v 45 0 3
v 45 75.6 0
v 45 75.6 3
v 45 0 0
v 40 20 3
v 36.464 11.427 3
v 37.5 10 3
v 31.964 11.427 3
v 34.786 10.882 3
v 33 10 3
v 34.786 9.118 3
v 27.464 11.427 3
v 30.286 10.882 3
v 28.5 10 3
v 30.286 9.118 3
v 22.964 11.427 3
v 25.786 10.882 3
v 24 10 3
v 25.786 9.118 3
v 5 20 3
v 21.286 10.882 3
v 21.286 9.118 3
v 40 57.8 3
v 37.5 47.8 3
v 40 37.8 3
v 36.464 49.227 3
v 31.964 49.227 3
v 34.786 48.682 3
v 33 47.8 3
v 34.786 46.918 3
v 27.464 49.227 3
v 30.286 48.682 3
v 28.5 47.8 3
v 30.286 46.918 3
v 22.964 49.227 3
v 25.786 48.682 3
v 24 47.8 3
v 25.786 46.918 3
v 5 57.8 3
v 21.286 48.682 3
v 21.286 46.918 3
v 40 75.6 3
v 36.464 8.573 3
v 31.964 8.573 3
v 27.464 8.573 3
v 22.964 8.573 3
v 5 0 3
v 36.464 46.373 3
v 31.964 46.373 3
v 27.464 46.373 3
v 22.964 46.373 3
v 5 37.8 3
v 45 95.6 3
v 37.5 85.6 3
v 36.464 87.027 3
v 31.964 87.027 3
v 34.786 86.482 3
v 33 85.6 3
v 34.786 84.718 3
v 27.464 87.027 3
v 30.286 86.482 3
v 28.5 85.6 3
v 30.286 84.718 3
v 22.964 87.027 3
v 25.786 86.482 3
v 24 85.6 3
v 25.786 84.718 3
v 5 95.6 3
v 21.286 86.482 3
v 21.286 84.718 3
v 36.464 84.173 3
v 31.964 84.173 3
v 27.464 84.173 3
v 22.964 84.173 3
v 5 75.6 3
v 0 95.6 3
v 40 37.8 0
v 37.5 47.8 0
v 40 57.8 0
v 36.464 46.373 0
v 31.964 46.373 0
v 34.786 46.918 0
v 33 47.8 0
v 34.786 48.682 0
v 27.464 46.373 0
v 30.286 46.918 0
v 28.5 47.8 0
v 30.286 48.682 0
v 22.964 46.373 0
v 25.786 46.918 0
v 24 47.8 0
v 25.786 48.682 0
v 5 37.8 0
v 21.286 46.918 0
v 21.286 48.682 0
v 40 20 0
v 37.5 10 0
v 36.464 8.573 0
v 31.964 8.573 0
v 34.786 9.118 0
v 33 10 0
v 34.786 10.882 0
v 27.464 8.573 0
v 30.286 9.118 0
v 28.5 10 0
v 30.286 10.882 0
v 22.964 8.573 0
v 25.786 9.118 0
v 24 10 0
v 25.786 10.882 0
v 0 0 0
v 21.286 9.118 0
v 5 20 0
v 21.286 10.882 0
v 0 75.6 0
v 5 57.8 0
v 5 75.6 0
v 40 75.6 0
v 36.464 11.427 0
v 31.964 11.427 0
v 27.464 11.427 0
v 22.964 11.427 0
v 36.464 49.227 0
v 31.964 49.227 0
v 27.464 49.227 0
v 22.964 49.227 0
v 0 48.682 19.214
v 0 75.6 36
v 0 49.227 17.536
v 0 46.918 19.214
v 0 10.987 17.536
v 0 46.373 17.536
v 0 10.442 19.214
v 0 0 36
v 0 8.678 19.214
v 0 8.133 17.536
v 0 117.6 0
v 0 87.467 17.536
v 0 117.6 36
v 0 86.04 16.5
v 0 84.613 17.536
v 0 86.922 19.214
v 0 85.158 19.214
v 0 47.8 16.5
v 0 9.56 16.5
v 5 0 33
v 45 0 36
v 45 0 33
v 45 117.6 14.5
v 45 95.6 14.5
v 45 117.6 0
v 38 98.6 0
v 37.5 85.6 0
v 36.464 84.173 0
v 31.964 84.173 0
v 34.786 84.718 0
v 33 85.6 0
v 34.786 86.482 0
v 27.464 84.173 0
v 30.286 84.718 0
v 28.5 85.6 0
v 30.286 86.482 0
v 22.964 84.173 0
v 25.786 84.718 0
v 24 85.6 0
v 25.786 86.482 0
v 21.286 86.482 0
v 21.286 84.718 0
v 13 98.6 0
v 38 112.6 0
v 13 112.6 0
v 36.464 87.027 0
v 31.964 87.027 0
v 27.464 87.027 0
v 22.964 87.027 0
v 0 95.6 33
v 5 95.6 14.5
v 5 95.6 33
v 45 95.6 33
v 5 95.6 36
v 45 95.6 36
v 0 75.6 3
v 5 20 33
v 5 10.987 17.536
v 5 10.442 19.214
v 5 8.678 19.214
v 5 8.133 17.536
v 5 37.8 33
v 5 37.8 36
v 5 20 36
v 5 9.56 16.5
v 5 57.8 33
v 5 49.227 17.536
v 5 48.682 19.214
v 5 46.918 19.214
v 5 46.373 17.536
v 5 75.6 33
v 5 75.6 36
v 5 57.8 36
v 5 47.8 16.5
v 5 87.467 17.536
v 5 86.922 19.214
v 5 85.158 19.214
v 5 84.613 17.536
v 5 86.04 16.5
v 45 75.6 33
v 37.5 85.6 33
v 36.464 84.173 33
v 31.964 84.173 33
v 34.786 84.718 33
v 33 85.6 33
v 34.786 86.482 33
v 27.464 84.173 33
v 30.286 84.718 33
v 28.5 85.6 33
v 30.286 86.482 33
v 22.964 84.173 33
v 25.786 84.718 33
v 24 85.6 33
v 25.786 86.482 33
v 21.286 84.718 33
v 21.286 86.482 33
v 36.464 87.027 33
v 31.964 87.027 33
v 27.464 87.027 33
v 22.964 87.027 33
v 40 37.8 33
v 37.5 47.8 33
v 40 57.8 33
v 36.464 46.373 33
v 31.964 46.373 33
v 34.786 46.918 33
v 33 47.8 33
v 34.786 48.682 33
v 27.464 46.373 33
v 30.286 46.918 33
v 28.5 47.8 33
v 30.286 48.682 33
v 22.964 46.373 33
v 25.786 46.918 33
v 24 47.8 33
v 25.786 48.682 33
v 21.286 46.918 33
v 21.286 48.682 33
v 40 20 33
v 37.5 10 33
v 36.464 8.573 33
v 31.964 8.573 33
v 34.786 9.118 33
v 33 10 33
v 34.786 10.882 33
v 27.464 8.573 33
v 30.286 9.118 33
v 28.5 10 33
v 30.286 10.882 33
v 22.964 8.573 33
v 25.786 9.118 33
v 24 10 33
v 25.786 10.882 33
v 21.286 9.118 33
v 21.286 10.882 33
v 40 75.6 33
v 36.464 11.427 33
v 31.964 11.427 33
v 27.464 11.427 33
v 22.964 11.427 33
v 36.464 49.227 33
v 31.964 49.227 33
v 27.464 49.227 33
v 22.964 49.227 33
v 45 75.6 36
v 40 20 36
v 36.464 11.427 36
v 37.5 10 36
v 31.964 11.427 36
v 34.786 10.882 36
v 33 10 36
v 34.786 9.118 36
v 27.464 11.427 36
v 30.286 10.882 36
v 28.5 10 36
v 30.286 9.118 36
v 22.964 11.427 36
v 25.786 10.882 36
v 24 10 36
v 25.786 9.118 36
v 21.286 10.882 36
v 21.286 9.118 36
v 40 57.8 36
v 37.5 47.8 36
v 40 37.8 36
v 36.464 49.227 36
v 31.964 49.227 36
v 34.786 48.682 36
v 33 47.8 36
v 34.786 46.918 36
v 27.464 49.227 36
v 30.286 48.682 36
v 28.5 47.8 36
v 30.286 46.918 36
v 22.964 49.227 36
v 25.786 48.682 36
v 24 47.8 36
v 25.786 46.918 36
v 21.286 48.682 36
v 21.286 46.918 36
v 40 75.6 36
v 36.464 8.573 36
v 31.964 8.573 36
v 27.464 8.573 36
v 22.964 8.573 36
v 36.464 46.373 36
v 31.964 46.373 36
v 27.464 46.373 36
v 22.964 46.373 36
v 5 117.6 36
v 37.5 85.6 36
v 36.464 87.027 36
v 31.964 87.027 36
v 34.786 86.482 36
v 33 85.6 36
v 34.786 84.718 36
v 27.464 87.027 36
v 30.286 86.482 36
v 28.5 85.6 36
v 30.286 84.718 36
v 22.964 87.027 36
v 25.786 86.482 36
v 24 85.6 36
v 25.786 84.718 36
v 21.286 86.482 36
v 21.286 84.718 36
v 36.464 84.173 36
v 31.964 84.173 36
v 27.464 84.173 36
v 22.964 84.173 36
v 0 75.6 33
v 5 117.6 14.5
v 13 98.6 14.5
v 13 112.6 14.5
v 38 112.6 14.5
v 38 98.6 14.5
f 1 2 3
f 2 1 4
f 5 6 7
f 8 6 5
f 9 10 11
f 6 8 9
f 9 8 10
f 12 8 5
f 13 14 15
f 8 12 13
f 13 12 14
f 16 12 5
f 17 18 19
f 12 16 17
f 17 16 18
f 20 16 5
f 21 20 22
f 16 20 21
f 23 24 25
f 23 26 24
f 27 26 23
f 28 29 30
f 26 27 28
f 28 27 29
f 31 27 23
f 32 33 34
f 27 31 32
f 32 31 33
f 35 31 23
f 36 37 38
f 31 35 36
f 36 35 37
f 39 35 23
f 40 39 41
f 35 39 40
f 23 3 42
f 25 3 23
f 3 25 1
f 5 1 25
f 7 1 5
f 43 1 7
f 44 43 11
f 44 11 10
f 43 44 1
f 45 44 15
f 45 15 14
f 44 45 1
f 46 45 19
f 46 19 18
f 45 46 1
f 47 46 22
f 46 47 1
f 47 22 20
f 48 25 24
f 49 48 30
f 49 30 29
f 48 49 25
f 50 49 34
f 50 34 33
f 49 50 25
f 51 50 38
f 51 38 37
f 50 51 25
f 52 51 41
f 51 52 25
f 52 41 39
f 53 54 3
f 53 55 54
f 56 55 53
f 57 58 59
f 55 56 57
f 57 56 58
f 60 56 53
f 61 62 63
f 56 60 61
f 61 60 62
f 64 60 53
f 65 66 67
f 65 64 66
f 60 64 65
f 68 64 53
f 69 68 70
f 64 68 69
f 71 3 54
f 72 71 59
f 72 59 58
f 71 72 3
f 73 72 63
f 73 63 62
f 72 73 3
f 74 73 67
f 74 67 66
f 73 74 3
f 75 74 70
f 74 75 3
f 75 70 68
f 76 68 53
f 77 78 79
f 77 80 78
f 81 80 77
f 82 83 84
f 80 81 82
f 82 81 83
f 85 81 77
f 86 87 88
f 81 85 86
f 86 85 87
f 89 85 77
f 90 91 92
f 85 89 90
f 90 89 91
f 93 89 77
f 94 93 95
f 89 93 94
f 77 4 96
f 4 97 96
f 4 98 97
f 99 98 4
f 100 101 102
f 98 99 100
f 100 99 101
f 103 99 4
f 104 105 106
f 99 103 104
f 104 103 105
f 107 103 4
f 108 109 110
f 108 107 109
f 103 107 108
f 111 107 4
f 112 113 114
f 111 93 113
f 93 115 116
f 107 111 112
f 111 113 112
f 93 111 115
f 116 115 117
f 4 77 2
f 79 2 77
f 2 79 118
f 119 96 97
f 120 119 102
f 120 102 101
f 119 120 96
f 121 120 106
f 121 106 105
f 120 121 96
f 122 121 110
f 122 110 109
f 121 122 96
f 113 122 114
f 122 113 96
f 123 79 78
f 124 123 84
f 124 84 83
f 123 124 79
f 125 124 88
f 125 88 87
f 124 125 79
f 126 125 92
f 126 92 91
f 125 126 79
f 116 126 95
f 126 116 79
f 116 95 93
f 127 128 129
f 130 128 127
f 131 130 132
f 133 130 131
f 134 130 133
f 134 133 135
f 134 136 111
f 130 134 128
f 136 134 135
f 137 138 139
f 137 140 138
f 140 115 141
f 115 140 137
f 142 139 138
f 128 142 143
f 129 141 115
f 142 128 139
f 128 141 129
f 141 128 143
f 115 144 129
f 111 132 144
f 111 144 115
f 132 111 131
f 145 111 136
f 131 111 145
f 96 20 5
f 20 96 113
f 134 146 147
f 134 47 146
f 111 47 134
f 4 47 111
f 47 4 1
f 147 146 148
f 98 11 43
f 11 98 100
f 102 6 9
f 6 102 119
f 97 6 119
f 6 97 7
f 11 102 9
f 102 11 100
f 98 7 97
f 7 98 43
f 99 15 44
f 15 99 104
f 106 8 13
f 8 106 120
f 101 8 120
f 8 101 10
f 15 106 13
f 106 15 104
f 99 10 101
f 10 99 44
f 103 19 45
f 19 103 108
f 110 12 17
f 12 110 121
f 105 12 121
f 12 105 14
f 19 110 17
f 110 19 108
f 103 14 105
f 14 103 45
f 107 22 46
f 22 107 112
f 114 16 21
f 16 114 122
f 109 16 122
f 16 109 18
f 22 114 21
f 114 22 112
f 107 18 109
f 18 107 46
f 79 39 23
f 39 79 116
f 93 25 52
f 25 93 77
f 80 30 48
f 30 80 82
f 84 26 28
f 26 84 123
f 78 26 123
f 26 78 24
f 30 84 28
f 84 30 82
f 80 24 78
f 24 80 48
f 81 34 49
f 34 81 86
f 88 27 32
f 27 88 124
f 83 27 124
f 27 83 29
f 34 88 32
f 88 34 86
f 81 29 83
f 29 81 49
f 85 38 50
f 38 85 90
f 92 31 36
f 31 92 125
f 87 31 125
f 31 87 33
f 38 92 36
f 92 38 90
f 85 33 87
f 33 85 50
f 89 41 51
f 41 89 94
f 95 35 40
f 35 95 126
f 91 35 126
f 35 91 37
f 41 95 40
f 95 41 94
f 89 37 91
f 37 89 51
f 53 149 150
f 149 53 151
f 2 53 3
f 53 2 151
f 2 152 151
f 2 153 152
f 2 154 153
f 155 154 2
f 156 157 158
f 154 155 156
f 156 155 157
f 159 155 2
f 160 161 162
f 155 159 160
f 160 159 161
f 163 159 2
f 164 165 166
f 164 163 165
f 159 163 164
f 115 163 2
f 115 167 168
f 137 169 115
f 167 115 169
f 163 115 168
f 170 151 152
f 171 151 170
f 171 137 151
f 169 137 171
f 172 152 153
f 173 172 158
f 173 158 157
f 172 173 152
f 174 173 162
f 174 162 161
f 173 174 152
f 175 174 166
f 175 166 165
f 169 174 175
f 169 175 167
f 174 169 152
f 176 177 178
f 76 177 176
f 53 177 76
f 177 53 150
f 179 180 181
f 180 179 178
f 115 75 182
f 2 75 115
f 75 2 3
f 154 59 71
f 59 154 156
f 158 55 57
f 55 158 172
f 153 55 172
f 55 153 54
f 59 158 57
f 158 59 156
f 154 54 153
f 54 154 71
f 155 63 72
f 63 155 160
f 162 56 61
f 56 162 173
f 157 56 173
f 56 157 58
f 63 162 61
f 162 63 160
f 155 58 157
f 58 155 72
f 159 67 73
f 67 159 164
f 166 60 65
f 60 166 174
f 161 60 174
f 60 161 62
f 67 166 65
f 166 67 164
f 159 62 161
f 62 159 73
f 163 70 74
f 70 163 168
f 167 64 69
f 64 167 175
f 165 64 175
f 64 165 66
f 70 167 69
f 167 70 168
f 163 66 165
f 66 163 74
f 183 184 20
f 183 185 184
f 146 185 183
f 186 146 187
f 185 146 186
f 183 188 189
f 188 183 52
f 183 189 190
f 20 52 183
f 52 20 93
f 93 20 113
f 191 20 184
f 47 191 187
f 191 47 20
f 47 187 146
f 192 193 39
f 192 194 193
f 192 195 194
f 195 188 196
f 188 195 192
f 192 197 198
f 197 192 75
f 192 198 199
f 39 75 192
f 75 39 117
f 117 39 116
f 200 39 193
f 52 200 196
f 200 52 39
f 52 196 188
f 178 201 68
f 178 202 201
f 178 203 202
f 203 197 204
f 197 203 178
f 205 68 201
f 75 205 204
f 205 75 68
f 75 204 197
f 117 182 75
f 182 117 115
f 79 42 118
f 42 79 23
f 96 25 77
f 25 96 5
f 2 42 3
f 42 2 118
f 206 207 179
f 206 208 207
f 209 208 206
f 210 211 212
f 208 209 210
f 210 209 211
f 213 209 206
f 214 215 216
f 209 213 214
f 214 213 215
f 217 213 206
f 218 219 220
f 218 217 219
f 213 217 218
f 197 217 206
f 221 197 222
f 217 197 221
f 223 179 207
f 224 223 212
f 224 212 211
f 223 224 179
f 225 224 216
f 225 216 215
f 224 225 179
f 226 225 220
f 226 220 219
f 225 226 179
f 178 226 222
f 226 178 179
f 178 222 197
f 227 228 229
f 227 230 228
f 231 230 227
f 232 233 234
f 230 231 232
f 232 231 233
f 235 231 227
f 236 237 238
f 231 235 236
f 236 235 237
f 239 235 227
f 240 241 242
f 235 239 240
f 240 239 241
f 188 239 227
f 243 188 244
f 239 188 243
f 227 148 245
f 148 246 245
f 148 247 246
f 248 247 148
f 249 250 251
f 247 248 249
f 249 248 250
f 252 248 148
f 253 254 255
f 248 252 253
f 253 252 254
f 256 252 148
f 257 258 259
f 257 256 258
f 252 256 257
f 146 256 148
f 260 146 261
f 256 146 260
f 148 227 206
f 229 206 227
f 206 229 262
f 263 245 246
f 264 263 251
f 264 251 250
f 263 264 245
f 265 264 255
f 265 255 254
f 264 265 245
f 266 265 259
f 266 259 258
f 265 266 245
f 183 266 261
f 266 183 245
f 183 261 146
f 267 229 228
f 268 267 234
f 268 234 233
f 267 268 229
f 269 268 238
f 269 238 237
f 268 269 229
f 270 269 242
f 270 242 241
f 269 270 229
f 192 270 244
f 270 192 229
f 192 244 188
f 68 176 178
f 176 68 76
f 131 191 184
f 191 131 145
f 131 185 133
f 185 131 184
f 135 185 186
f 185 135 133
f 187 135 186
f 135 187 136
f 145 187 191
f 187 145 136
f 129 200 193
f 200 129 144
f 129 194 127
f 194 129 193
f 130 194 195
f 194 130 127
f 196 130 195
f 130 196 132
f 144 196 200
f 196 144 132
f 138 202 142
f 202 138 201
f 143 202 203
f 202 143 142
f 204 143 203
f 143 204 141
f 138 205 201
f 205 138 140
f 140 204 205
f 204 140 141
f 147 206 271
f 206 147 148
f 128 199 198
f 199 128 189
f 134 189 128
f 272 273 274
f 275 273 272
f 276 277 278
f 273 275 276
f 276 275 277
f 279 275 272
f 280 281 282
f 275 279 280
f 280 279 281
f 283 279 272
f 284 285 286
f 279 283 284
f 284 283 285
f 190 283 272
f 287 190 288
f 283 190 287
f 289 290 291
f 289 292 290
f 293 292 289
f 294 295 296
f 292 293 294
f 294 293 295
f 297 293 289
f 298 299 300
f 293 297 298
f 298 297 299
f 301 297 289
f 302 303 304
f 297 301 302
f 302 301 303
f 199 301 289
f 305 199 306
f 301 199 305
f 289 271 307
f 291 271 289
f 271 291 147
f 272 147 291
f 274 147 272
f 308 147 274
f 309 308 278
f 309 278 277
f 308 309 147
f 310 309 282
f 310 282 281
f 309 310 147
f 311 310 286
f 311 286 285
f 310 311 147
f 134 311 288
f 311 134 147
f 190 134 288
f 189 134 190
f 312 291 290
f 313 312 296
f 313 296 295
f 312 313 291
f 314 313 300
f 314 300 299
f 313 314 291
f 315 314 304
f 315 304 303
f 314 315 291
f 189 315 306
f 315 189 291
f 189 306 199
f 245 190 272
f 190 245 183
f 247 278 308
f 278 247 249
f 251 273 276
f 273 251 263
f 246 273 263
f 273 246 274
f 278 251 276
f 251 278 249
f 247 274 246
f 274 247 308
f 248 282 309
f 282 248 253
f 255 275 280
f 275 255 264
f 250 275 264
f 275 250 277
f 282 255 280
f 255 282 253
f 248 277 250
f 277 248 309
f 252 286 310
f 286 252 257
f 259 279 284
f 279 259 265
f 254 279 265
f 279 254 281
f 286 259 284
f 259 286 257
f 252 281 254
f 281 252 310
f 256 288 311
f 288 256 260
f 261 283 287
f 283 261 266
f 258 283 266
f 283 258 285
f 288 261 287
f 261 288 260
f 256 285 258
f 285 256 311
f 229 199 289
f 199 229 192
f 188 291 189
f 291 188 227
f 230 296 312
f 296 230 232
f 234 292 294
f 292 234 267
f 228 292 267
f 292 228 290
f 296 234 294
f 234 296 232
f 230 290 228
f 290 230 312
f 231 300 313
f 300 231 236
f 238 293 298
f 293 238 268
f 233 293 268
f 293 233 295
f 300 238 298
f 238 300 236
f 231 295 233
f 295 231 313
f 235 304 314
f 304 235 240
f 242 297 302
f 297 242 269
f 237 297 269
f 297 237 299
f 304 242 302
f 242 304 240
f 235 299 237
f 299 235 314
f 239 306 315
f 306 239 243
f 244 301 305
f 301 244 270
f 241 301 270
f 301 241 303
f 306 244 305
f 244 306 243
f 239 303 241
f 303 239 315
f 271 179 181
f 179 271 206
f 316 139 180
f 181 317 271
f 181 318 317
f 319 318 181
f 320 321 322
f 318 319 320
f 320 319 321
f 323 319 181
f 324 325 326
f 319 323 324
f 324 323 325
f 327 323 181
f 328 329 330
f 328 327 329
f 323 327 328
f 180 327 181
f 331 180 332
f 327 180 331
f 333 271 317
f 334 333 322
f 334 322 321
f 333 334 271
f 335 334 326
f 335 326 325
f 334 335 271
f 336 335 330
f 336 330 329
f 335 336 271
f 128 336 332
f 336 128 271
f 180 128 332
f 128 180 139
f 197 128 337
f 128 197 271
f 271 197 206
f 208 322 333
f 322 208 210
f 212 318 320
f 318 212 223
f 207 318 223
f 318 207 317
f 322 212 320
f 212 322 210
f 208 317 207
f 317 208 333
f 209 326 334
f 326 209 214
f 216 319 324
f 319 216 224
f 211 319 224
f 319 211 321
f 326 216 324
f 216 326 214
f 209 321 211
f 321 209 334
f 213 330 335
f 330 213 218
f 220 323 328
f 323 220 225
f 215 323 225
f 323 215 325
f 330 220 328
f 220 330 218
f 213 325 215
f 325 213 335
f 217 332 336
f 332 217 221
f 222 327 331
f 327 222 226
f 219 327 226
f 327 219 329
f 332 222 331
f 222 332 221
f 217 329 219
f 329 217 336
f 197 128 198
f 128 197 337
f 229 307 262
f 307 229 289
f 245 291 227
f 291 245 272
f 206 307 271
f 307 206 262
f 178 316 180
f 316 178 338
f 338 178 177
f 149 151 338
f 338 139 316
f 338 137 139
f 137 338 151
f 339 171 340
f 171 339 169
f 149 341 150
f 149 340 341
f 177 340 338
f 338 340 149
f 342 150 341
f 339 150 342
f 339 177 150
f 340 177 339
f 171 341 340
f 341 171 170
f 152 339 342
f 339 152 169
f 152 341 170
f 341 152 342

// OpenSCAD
zahnradabstand = 37.8;

module 9g_motor(){
	difference(){			
		union(){
			color("SteelBlue") cube([23,12.5,22], center=true);
			color("SteelBlue") translate([0,0,5]) cube([32,12,2], center=true);
			color("SteelBlue") translate([5.5,0,2.75]) cylinder(r=6, h=25.75, $fn=20, center=true);
			color("SteelBlue") translate([-.5,0,2.75]) cylinder(r=1, h=25.75, $fn=20, center=true);
			color("SteelBlue") translate([-1,0,2.75]) cube([5,5.6,24.5], center=true);		
			color("white") translate([5.5,0,3.65]) cylinder(r=2.35, h=29.25, $fn=20, center=true);				
		}
		translate([10,0,-11]) rotate([0,-30,0]) cube([8,13,4], center=true);
		for ( hole = [14,-14] ){
			translate([hole,0,5]) cylinder(r=2.2, h=4, $fn=20, center=true);
		}	
	}
}

module stuetze (hoehe) {
    difference() {
        translate ([0,0,0])
        cube([hoehe,20,3], false);
        translate ([hoehe*0.8,10,0])
        cylinder(21,r=1.5, center=true);
        translate ([hoehe*0.7,10,0])
        cylinder(21,r=1.5, center=true);
        translate ([hoehe*0.6,10,0])
        cylinder(21,r=1.5, center=true);
        translate ([hoehe*0.5,10,0])
        cylinder(21,r=1.5, center=true);
    }
}

module balken (laenge) {
        translate ([0,-10,0])
        cube([5,laenge,3], false);
    
}

module boden(laenge, breite) {
    difference() {
        cube([5,laenge,breite], false);
        rotate([0,90,0])
        translate ([-breite/2,laenge*0.1,0])
        cylinder(6,r=1.5, center=false);
        rotate([0,90,0])
        translate ([-breite/2,laenge*0.5,0])
        cylinder(6,r=1.5, center=false);
        rotate([0,90,0])
        translate ([-breite/2,laenge*0.9,0])
        cylinder(6,r=1.5, center=false);
    }
}

module wand(hoehe, anzahl, abstand) {
    for (a =[0:abstand:anzahl*abstand])
        translate ([0,a,0])
        stuetze(hoehe);
    translate ([0,10,0])
    balken(anzahl*abstand);
    translate ([hoehe-5,10,0])
    balken(anzahl*abstand);
}

module halterung() {
    cube([5,22,36],false);
    cube([13,20,14.5],false);
    translate ([0,17,0])
    cube([45,5,14.5],false);
    translate ([0,0,0])
    cube([45,3,14.5],false);
    translate ([38,0,0])
    cube([7,20,14.5],false);
}
union() {
    translate ([0,0,0])
    wand(45,2,zahnradabstand);
    translate ([0,0,3])
    boden(zahnradabstand*2+20,30);
    translate ([0,0,33])
    wand(45,2,zahnradabstand);
    translate ([0,zahnradabstand*2+20,0])
    halterung();
}
//translate ([25,130,11])
//9g_motor();
